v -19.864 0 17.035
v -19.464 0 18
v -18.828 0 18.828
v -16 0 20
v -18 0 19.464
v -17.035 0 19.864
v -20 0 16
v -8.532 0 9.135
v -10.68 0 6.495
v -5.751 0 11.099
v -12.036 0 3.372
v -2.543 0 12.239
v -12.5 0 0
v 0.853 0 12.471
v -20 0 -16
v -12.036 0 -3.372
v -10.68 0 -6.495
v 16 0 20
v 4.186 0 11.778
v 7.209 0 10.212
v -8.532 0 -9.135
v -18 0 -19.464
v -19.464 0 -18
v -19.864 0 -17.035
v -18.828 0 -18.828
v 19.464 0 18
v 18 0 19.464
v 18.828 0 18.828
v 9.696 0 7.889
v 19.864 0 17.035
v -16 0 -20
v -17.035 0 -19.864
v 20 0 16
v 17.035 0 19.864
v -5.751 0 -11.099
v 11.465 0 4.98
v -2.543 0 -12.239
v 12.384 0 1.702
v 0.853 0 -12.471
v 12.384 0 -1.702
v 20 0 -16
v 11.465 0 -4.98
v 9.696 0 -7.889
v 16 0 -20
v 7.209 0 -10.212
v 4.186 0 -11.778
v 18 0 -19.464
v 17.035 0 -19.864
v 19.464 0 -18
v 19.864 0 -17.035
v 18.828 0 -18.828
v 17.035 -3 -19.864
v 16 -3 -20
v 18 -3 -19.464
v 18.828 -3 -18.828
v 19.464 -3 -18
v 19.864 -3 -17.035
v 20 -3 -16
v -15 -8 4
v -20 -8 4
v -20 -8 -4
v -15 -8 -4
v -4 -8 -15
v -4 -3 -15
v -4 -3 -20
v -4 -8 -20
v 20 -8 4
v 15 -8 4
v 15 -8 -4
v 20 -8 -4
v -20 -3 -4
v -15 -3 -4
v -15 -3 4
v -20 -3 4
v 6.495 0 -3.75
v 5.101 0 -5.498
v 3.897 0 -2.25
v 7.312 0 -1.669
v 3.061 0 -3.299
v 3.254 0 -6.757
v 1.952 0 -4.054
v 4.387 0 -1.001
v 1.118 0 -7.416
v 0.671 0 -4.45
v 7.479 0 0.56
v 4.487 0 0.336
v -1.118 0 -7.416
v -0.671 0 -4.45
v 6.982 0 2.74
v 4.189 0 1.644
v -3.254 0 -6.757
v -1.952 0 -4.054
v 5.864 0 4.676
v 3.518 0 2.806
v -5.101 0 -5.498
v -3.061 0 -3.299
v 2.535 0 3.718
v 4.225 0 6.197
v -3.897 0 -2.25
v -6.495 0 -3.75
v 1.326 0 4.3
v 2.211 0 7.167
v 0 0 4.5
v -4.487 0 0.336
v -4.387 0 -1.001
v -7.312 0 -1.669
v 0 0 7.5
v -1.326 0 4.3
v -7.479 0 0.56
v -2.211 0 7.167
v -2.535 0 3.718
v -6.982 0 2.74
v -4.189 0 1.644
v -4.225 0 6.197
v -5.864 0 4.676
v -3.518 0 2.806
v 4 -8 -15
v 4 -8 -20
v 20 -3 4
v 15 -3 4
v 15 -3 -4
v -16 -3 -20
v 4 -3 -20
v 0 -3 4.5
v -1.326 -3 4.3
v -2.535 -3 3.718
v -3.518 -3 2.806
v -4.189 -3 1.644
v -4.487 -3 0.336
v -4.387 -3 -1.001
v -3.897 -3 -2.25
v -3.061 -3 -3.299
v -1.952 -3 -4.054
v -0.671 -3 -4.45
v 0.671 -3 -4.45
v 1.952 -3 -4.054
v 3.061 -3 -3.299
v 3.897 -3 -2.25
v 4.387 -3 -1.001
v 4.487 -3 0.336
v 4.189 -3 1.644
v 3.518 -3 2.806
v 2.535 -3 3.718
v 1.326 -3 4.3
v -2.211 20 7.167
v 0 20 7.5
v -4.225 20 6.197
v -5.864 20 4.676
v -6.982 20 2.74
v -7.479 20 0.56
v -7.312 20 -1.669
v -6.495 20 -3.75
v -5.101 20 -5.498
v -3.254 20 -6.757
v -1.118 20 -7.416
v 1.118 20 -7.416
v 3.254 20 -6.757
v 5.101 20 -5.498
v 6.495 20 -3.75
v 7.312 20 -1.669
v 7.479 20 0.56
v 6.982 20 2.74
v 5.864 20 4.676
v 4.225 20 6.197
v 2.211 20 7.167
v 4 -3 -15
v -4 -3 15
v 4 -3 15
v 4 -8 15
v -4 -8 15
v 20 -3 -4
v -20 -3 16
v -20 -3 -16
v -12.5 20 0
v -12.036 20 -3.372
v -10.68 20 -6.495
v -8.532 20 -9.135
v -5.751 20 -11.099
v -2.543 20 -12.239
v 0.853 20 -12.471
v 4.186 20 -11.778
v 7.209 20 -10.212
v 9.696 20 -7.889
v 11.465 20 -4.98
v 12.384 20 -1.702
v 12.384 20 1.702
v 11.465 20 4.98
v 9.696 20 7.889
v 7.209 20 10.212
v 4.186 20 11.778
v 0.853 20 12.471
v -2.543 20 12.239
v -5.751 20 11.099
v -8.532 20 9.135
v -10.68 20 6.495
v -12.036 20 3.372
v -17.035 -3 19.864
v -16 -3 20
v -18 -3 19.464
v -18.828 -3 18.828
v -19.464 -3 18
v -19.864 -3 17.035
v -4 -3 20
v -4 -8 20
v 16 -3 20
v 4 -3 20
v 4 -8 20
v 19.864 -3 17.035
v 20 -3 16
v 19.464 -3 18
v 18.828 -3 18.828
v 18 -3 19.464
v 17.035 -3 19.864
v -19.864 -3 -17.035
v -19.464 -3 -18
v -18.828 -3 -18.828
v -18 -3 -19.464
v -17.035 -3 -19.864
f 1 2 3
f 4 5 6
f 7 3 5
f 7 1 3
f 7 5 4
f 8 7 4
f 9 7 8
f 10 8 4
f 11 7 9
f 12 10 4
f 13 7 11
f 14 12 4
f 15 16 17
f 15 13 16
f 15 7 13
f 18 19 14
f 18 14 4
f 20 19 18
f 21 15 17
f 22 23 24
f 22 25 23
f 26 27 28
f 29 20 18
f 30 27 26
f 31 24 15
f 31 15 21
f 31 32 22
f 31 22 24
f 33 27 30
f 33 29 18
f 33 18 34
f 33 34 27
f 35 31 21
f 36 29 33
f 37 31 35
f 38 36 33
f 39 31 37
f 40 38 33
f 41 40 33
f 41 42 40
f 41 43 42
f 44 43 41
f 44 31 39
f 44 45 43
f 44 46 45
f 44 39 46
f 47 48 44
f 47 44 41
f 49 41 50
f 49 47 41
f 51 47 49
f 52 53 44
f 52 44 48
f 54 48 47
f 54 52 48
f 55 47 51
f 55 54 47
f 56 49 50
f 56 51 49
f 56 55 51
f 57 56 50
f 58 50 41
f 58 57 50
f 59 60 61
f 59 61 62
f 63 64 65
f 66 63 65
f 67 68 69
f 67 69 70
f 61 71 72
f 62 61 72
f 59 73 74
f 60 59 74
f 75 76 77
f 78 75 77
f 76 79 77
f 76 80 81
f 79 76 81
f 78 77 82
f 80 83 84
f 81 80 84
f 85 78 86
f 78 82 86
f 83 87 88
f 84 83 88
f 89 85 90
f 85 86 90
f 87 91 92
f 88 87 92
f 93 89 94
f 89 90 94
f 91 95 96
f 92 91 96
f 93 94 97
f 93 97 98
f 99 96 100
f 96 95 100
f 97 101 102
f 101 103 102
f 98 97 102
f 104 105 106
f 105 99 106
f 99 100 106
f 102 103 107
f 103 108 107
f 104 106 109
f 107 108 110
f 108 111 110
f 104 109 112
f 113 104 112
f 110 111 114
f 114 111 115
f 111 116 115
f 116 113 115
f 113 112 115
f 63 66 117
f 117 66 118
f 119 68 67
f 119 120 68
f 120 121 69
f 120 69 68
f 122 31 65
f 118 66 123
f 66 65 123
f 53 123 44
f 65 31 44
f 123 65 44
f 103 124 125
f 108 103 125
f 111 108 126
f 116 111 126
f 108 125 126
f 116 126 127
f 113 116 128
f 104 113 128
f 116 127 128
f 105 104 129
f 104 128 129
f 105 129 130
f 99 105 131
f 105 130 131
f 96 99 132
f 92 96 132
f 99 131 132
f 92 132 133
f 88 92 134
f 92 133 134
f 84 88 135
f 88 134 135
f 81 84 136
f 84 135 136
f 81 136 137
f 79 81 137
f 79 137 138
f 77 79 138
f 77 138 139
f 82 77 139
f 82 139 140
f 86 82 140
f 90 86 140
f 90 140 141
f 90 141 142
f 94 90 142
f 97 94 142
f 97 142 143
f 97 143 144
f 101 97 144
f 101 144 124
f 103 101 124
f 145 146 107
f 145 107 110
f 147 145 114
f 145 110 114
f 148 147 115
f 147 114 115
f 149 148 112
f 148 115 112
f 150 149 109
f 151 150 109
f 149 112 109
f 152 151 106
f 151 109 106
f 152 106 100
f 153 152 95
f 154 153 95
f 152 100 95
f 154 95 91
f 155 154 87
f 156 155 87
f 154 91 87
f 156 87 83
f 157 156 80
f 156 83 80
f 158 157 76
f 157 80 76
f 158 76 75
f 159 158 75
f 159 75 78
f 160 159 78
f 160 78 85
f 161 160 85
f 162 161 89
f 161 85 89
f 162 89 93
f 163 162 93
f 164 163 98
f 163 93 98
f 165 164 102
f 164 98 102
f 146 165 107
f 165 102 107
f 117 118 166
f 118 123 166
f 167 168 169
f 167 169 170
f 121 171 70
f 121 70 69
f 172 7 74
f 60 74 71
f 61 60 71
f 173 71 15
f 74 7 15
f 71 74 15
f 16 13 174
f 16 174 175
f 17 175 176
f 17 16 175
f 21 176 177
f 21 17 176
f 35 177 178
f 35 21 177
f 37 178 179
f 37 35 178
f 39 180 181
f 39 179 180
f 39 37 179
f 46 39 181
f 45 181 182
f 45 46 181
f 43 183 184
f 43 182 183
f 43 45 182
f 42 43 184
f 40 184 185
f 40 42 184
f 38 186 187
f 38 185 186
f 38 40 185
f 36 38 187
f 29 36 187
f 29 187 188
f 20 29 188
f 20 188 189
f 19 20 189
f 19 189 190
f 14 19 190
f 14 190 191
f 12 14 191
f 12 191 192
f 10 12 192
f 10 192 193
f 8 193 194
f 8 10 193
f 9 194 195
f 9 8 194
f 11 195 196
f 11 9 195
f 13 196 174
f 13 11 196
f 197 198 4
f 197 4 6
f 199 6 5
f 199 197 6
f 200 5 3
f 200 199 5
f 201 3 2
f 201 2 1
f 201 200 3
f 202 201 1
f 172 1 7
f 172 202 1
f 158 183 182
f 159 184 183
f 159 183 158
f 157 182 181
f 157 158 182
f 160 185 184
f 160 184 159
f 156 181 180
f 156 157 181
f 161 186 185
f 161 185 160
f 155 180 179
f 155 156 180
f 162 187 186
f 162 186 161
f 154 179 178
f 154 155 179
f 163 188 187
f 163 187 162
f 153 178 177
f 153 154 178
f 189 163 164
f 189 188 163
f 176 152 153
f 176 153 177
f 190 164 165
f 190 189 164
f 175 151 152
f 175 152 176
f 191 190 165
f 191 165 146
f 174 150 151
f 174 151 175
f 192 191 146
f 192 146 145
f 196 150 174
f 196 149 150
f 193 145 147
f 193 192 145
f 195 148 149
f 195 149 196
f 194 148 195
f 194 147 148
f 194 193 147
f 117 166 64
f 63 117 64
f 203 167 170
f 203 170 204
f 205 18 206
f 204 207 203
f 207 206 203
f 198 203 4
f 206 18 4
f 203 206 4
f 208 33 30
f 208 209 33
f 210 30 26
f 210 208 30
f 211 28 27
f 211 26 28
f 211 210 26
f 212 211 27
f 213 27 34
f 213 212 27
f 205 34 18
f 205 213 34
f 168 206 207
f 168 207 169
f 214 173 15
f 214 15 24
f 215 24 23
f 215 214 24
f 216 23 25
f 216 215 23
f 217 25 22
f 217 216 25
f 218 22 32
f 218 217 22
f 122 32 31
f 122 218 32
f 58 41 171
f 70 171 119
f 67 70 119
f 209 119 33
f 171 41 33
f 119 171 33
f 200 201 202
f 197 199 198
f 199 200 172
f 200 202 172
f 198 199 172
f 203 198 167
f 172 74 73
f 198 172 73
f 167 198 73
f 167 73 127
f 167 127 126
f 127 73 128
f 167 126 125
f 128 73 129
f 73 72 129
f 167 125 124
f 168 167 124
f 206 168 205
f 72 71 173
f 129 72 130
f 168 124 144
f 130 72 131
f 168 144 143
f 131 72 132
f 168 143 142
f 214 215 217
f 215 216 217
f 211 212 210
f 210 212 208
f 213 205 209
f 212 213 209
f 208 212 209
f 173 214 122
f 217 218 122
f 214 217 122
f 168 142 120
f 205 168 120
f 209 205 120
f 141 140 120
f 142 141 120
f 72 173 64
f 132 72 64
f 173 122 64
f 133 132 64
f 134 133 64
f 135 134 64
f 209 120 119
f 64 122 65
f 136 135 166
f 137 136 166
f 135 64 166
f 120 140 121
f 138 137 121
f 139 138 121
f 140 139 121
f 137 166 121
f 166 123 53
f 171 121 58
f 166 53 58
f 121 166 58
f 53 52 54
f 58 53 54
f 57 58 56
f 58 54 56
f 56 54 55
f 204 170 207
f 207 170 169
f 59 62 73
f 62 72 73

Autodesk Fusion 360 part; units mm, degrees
sketch "Sketch1" plane through (0, 0, 0) normal (0, 1, 0) x (1, 0, 0)
  line L0 (20, -20) -> (-20, -20)
  line L1 (-20, -20) -> (-20, 20)
  line L2 (-20, 20) -> (20, 20)
  line L3 (20, 20) -> (20, -20)
  line L4 (20, -20) -> (-20, 20) construction
  line L5 (-20, -20) -> (20, 20) construction
  line L6 (-20, 4) -> (-15, 4)
  line L7 (-15, 4) -> (-15, -4)
  line L8 (-15, -4) -> (-20, -4)
  line L9 (-20, -4) -> (-20, 4)
  line L10 (-4, 20) -> (4, 20)
  line L11 (4, 20) -> (4, 15)
  line L12 (4, 15) -> (-4, 15)
  line L13 (-4, 15) -> (-4, 20)
  line L14 (20, 4) -> (15, 4)
  line L15 (15, 4) -> (15, -4)
  line L16 (15, -4) -> (20, -4)
  line L17 (20, -4) -> (20, 4)
  line L18 (-4, -20) -> (4, -20)
  line L19 (4, -20) -> (4, -15)
  line L20 (4, -15) -> (-4, -15)
  line L21 (-4, -15) -> (-4, -20)
  dimension "d1" = 40
  dimension "d2" = 40
  dimension "d3" = 5
  dimension "d4" = 8
  dimension "d5" = 16
  dimension "d6" = 5
  dimension "d7" = 16
  dimension "d8" = 8
  dimension "d9" = 5
  dimension "d10" = 5
  dimension "d11" = 8
  dimension "d12" = 8
  dimension "d13" = 16
  dimension "d14" = 16
extrude "Extrude1" add sketch "Sketch1" against normal blind 3 contours L0 L1 L2 L3 L6 L7 L8 L11 L12 L13 L14 L15 L16 L19 L20 L21
extrude "Extrude2" add sketch "Sketch1" against normal blind 8 contours L0 L18 L19 L20 L21 | L3 L14 L15 L16 L17 | L1 L6 L7 L8 L9 | L2 L10 L11 L12 L13
hole "Hole1" at (0, 0, 0) direction (0, -1, 0) diameter 9 depth 30 tip angle 118
fillet "Fillet1" radius 4 4 edges at (20, -1.5, -20) (-20, -1.5, -20) (20, -1.5, 20) (-20, -1.5, 20)
sketch "Sketch2" plane through (0, 0, 0) normal (0, 1, 0) x (-1, 0, 0)
  circle A0 centre (0, 0) radius 4.5
  arc A1 (20, 16) -> (16, 20) centre (16, 16) ccw
  line L0 (16, 20) -> (-16, 20)
  arc A2 (-16, 20) -> (-20, 16) centre (-16, 16) ccw
  line L1 (-20, 16) -> (-20, -16)
  arc A3 (-20, -16) -> (-16, -20) centre (-16, -16) ccw
  line L2 (-16, -20) -> (16, -20)
  arc A4 (16, -20) -> (20, -16) centre (16, -16) ccw
  line L3 (20, -16) -> (20, 16)
  circle A5 centre (0, 0) radius 12.5
  dimension "d24" = 25
extrude "Extrude3" add sketch "Sketch2" along normal blind 20 contours A5
sketch "Sketch3" plane through (0, 20, 0) normal (0, 1, 0) x (-1, 0, 0)
  circle A0 centre (0, 0) radius 4.5
  circle A1 centre (0, 0) radius 12.5
hole "Hole2" at (0, 20, 0) direction (0, -1, 0) diameter 9 depth 40.942 tip angle 118 counterbore diameter 15 counterbore depth 20
equation "d6 = d3"
equation "d7 = d5"
equation "d8 = d4"
equation "d9 = d3"
equation "d10 = d3"
equation "d11 = d4"
equation "d12 = d4"
equation "d13 = d7"
equation "d14 = d7"
